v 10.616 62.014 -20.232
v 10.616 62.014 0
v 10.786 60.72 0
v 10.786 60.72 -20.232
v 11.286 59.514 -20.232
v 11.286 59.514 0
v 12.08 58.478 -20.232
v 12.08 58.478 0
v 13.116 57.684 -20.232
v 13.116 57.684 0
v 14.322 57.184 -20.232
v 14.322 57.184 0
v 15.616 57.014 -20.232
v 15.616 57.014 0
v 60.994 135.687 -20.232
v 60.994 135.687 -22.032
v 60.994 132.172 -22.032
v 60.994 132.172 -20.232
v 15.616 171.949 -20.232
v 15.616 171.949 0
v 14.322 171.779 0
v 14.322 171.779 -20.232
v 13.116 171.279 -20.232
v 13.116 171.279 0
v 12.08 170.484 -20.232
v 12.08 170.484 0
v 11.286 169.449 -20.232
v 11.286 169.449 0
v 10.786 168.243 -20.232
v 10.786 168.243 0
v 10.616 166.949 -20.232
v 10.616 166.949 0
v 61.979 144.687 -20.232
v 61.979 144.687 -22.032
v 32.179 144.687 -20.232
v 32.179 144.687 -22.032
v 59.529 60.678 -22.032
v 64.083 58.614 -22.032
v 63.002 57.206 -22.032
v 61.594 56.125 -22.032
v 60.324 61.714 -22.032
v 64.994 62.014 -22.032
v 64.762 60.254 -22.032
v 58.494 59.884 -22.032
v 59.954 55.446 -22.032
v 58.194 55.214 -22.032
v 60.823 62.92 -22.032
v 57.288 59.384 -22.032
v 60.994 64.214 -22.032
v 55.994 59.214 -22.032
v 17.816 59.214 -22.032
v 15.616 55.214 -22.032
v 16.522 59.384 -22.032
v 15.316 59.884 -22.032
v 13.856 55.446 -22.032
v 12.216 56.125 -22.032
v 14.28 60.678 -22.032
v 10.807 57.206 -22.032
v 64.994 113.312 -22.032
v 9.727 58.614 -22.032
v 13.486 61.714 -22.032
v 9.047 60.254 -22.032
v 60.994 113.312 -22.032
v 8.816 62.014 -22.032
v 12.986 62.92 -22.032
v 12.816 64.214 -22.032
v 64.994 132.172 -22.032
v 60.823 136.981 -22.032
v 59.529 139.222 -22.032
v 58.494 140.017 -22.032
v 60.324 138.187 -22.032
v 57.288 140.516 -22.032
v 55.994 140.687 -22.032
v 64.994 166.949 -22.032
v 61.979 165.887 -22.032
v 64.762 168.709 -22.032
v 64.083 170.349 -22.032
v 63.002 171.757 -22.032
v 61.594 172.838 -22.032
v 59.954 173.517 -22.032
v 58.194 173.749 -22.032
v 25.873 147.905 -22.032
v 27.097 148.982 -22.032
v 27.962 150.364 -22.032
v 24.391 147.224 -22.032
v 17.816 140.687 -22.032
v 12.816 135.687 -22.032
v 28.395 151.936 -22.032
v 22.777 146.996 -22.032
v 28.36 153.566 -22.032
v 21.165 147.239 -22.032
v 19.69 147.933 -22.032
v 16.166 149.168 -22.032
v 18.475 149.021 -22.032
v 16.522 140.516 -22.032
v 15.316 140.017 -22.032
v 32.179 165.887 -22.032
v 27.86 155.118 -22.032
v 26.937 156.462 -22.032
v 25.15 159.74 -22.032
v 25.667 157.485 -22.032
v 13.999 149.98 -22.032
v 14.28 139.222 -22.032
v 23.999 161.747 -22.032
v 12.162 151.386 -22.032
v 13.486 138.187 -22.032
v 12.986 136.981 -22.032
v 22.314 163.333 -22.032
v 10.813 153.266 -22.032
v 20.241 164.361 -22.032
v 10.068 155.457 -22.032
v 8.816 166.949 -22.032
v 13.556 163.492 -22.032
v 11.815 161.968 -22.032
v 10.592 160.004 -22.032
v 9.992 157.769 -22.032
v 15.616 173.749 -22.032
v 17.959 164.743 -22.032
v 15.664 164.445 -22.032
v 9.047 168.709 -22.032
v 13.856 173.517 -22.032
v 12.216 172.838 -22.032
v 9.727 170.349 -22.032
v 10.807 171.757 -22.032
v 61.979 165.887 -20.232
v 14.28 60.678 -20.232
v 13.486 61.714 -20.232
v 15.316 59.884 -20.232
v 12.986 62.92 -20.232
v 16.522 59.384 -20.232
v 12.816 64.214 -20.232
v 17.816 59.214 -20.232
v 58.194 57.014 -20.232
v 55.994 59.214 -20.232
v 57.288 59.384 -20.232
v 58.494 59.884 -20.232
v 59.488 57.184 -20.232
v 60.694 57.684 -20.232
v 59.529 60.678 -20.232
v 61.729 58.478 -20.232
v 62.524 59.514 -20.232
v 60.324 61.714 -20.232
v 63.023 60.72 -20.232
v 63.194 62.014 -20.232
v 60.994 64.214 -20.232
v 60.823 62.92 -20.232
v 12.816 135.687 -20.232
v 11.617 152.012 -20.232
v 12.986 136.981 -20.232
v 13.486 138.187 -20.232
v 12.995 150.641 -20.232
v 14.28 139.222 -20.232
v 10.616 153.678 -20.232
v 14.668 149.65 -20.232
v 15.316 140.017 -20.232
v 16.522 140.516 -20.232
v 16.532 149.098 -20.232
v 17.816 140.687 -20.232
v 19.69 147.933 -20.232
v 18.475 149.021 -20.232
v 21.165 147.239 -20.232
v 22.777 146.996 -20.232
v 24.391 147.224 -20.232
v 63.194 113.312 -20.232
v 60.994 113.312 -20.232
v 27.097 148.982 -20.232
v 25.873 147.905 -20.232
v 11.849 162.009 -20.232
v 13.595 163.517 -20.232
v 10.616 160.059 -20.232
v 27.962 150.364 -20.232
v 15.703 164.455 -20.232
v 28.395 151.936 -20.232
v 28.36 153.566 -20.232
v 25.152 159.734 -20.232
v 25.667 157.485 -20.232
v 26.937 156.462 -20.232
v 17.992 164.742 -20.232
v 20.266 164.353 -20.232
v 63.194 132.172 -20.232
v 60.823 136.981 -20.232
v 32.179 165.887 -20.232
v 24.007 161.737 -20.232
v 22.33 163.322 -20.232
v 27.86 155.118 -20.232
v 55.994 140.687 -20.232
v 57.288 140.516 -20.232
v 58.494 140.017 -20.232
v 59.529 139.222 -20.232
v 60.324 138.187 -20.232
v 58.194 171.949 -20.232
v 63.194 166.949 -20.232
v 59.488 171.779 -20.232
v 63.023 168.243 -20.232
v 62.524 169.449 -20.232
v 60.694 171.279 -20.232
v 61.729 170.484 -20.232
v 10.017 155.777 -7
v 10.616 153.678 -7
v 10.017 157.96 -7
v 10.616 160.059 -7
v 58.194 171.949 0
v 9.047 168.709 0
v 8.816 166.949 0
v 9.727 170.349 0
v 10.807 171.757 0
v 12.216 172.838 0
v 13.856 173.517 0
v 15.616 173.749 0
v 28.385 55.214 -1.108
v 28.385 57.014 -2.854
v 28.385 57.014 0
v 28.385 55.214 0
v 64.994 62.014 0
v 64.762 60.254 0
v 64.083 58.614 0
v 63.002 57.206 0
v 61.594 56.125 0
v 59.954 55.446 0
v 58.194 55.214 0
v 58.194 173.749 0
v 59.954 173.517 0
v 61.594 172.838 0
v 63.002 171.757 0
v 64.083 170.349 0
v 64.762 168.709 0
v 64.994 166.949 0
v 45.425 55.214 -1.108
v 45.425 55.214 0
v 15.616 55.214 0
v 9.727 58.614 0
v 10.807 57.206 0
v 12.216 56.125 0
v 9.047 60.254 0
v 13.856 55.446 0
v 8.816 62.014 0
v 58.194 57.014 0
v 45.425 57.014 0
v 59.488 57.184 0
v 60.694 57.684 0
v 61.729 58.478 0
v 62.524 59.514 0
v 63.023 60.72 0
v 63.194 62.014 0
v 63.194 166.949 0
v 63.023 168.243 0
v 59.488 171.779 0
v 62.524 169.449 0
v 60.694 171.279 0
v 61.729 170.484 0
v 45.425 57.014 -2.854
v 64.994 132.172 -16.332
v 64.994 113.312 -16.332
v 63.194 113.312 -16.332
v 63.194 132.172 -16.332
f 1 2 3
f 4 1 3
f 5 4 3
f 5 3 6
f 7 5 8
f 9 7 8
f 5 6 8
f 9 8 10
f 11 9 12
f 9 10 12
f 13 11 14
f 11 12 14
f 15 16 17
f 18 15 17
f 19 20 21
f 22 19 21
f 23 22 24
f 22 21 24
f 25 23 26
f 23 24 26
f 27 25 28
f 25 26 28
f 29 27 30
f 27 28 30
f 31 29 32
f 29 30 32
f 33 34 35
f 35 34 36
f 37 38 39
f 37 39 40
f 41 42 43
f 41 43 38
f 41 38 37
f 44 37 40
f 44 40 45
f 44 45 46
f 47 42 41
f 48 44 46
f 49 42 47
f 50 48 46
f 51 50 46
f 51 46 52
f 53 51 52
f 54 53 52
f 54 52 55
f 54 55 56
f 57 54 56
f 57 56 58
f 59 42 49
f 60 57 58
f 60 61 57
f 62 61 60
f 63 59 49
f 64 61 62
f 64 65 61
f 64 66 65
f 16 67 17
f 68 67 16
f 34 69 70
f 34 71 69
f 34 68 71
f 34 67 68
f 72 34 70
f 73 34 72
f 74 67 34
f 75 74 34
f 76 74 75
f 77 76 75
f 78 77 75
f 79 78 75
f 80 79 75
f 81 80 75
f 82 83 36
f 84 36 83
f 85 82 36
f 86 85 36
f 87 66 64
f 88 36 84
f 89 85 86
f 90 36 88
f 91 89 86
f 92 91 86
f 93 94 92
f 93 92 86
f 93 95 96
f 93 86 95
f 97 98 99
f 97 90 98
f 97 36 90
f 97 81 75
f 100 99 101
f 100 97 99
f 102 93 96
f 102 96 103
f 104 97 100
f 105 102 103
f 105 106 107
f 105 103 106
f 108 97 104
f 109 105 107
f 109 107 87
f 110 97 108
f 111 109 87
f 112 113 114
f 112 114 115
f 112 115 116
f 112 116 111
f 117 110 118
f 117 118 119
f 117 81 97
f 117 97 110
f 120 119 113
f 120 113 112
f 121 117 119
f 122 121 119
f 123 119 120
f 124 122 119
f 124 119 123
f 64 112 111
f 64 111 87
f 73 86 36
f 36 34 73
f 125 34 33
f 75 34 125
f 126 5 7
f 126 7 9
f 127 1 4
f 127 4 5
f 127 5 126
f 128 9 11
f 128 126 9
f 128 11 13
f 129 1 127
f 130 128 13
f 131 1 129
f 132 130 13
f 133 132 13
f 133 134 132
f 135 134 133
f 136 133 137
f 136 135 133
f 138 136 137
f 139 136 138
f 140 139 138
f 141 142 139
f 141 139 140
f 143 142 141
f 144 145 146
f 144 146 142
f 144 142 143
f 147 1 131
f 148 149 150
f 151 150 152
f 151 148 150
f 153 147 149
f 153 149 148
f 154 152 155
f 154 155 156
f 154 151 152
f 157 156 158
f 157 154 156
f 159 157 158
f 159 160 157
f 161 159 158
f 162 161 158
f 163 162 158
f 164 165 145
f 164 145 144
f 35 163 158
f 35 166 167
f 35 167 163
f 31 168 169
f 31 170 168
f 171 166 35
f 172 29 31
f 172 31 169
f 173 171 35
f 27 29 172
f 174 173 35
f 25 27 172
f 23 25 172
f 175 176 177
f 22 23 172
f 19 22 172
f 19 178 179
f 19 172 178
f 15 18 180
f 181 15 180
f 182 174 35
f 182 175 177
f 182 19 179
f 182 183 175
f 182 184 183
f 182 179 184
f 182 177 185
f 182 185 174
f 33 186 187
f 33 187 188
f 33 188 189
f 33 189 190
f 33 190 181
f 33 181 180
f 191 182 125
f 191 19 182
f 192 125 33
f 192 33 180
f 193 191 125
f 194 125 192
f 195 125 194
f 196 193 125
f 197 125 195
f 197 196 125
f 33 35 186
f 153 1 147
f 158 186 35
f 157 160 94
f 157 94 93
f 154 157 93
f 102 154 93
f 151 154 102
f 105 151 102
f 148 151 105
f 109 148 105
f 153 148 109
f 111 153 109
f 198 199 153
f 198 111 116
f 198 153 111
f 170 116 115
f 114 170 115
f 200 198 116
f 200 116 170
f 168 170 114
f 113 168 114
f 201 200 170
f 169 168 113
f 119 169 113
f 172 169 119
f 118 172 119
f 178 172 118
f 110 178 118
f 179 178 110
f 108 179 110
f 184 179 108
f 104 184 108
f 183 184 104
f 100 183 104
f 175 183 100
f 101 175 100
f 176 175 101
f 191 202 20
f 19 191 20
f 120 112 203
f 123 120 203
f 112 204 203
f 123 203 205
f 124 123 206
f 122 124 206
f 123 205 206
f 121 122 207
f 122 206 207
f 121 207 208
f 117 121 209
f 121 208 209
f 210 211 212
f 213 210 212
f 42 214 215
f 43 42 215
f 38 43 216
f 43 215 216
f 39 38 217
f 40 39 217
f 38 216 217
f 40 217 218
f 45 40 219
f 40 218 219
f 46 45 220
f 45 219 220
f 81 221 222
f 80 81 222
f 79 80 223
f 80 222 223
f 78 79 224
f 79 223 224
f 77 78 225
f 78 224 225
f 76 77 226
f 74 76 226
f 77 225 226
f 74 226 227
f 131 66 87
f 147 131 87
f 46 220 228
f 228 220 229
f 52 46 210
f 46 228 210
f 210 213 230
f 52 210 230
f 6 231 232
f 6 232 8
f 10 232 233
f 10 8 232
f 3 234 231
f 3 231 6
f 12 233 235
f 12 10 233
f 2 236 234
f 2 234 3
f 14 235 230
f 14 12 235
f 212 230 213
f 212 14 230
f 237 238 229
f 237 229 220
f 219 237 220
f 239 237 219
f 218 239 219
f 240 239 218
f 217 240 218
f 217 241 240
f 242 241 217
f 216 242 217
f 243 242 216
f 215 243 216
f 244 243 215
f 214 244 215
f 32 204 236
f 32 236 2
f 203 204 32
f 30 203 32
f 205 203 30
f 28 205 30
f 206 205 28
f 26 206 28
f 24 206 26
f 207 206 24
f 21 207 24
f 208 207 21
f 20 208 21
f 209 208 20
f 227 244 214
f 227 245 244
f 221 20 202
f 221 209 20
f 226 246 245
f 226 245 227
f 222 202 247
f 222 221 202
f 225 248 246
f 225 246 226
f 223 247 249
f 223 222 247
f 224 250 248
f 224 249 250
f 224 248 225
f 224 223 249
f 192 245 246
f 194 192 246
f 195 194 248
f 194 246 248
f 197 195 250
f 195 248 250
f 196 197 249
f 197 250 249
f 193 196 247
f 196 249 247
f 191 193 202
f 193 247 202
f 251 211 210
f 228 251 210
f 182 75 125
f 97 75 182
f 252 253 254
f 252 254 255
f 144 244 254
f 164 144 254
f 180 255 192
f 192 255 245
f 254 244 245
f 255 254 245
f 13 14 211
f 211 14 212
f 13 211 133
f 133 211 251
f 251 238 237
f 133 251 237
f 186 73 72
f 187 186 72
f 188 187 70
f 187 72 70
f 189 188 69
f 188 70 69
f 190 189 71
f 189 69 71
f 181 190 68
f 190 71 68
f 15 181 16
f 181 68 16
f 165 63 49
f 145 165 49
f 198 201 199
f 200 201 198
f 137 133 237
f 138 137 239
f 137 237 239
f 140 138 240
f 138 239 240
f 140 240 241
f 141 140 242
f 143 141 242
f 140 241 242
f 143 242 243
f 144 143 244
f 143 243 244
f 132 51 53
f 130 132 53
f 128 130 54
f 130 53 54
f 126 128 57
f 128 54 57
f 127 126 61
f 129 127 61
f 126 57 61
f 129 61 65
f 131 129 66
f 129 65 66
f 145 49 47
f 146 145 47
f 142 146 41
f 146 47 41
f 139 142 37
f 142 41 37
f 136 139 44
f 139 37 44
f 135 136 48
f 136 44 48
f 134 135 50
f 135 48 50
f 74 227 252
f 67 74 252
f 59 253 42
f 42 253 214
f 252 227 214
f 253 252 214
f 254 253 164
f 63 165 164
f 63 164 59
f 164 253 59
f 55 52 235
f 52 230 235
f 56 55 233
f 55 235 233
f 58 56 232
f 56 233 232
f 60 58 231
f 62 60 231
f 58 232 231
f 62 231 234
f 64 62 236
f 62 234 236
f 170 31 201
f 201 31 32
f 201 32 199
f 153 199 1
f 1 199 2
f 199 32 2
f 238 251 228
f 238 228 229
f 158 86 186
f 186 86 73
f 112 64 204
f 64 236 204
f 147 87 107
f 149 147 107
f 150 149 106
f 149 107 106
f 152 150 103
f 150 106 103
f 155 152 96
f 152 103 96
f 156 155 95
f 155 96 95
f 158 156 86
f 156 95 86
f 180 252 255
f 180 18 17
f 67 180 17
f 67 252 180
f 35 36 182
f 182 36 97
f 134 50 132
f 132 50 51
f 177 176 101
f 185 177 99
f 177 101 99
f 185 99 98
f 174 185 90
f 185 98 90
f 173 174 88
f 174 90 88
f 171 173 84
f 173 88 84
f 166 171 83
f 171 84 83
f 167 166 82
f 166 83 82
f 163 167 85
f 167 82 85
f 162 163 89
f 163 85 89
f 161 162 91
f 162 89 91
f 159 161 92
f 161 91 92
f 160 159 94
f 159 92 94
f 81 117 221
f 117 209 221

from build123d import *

# Parameters (mm, degrees)
BOSS_EXTRUDE1_DEPTH = 6.999999996
SKETCH2_R           = 7.875521796
BOSS_EXTRUDE2_DEPTH = 15.032422661
SKETCH3_R           = 5.636
SKETCH3_W           = 29.8
SKETCH3_H           = 21.2
CUT_EXTRUDE1_DEPTH  = 6.88
CUT_EXTRUDE2_DEPTH  = 13.232422661
SKETCH5_W           = 6.5
SKETCH5_H           = 18.860946171
CUT_EXTRUDE3_DEPTH  = 6.88
CUT_EXTRUDE4_DEPTH  = 8.52


with BuildPart() as part:
    # Sketch1 → Boss-Extrude1 (new body)
    with BuildSketch(Plane.XY):
        with BuildLine():
            Line((64.993664433, 62.013874967), (64.993664433, 166.948874967))
            ThreePointArc((64.993664433, 166.948874967), (63.001990545, 171.757201079), (58.193664433, 173.748874967))
            Line((58.193664433, 173.748874967), (15.615664433, 173.748874967))
            ThreePointArc((15.615664433, 173.748874967), (10.807338321, 171.757201079), (8.815664433, 166.948874967))
            Line((8.815664433, 166.948874967), (8.815664433, 62.013874967))
            ThreePointArc((8.815664433, 62.013874967), (10.807338321, 57.205548855), (15.615664433, 55.213874967))
            Line((15.615664433, 55.213874967), (58.193664433, 55.213874967))
            ThreePointArc((58.193664433, 55.213874967), (63.001990545, 57.205548855), (64.993664433, 62.013874967))
        make_face()
        with BuildLine():
            Line((63.193664433, 62.013874967), (63.193664433, 166.948874967))
            ThreePointArc((63.193664433, 166.948874967), (61.729198339, 170.484408873), (58.193664433, 171.948874967))
            Line((58.193664433, 171.948874967), (15.615664433, 171.948874967))
            ThreePointArc((15.615664433, 171.948874967), (12.080130527, 170.484408873), (10.615664433, 166.948874967))
            Line((10.615664433, 166.948874967), (10.615664433, 62.013874967))
            ThreePointArc((10.615664433, 62.013874967), (12.080130527, 58.478341061), (15.615664433, 57.013874967))
            Line((15.615664433, 57.013874967), (58.193664433, 57.013874967))
            ThreePointArc((58.193664433, 57.013874967), (61.729198339, 58.478341061), (63.193664433, 62.013874967))
        make_face(mode=Mode.SUBTRACT)
    extrude(amount=-BOSS_EXTRUDE1_DEPTH)

    # Sketch2 → Boss-Extrude2 (add)
    with BuildSketch(Plane(origin=(0, 0, -6.999999996), x_dir=(-1, 0, 0), z_dir=(0, 0, -1))):
        with BuildLine():
            Line((-58.193664433, 55.213874967), (-15.615664433, 55.213874967))
            ThreePointArc((-15.615664433, 55.213874967), (-10.807338321, 57.205548855), (-8.815664433, 62.013874967))
            Line((-8.815664433, 62.013874967), (-8.815664433, 166.948874967))
            ThreePointArc((-8.815664433, 166.948874967), (-10.807338321, 171.757201079), (-15.615664433, 173.748874967))
            Line((-15.615664433, 173.748874967), (-58.193664433, 173.748874967))
            ThreePointArc((-58.193664433, 173.748874967), (-63.001990545, 171.757201079), (-64.993664433, 166.948874967))
            Line((-64.993664433, 166.948874967), (-64.993664433, 62.013874967))
            ThreePointArc((-64.993664433, 62.013874967), (-63.001990545, 57.205548855), (-58.193664433, 55.213874967))
        make_face()
        with Locations(Location((-17.816098985, 156.86861317, 0), (0, 0, 90))):
            Circle(SKETCH2_R, mode=Mode.SUBTRACT)
    extrude(amount=BOSS_EXTRUDE2_DEPTH)

    # Sketch3 → Cut-Extrude1 (cut)
    with BuildSketch(Plane(origin=(0, 0, -22.032422657), x_dir=(-1, 0, 0), z_dir=(0, 0, -1))):
        with Locations((-22.802237874, 152.631613686)):
            Circle(SKETCH3_R)
        with BuildLine():
            Line((-60.993664433, 135.686808525), (-60.993664433, 64.213874967))
            ThreePointArc((-60.993664433, 64.213874967), (-59.529198339, 60.678341061), (-55.993664433, 59.213874967))
            Line((-55.993664433, 59.213874967), (-17.815664433, 59.213874967))
            ThreePointArc((-17.815664433, 59.213874967), (-14.280130527, 60.678341061), (-12.815664433, 64.213874967))
            Line((-12.815664433, 64.213874967), (-12.815664433, 135.686808525))
            ThreePointArc((-12.815664433, 135.686808525), (-14.280130527, 139.222342431), (-17.815664433, 140.686808525))
            Line((-17.815664433, 140.686808525), (-55.993664433, 140.686808525))
            ThreePointArc((-55.993664433, 140.686808525), (-59.529198339, 139.222342431), (-60.993664433, 135.686808525))
        make_face()
        with Locations((-47.079251594, 155.286808525)):
            Rectangle(SKETCH3_W, SKETCH3_H)
    extrude(amount=-CUT_EXTRUDE1_DEPTH, mode=Mode.SUBTRACT)

    # Sketch4 → Cut-Extrude2 (cut)
    with BuildSketch(Plane.XY.offset(-6.999999996)):
        with BuildLine():
            Line((15.615664433, 57.013874967), (58.193664433, 57.013874967))
            ThreePointArc((58.193664433, 57.013874967), (61.729198339, 58.478341061), (63.193664433, 62.013874967))
            Line((63.193664433, 62.013874967), (63.193664433, 166.948874967))
            ThreePointArc((63.193664433, 166.948874967), (61.729198339, 170.484408873), (58.193664433, 171.948874967))
            Line((58.193664433, 171.948874967), (15.615664433, 171.948874967))
            ThreePointArc((15.615664433, 171.948874967), (12.080130527, 170.484408873), (10.615664433, 166.948874967))
            Line((10.615664433, 166.948874967), (10.615664433, 160.058846048))
            ThreePointArc((10.615664433, 160.058846048), (25.691620781, 156.86861317), (10.615664433, 153.678380292))
            Line((10.615664433, 153.678380292), (10.615664433, 62.013874967))
            ThreePointArc((10.615664433, 62.013874967), (12.080130527, 58.478341061), (15.615664433, 57.013874967))
        make_face()
    extrude(amount=-CUT_EXTRUDE2_DEPTH, mode=Mode.SUBTRACT)

    # Sketch5 → Cut-Extrude3 (cut)
    with BuildSketch(Plane(origin=(64.993664433, 0, 0), x_dir=(0, 0, -1), z_dir=(1, 0, 0))):
        with Locations((19.582422658, 122.741984607)):
            Rectangle(SKETCH5_W, SKETCH5_H)
    extrude(amount=-CUT_EXTRUDE3_DEPTH, mode=Mode.SUBTRACT)

    # Sketch6 → Cut-Extrude4 (cut, symmetric)
    with BuildSketch(Plane.ZY.offset(-36.904664433)):
        Polygon((0, 57.013874967), (-2.853568486, 57.013874967), (-1.108049312, 55.213874967), (0, 55.213874967), align=None)
    extrude(amount=CUT_EXTRUDE4_DEPTH, both=True, mode=Mode.SUBTRACT)


solid = part.part
